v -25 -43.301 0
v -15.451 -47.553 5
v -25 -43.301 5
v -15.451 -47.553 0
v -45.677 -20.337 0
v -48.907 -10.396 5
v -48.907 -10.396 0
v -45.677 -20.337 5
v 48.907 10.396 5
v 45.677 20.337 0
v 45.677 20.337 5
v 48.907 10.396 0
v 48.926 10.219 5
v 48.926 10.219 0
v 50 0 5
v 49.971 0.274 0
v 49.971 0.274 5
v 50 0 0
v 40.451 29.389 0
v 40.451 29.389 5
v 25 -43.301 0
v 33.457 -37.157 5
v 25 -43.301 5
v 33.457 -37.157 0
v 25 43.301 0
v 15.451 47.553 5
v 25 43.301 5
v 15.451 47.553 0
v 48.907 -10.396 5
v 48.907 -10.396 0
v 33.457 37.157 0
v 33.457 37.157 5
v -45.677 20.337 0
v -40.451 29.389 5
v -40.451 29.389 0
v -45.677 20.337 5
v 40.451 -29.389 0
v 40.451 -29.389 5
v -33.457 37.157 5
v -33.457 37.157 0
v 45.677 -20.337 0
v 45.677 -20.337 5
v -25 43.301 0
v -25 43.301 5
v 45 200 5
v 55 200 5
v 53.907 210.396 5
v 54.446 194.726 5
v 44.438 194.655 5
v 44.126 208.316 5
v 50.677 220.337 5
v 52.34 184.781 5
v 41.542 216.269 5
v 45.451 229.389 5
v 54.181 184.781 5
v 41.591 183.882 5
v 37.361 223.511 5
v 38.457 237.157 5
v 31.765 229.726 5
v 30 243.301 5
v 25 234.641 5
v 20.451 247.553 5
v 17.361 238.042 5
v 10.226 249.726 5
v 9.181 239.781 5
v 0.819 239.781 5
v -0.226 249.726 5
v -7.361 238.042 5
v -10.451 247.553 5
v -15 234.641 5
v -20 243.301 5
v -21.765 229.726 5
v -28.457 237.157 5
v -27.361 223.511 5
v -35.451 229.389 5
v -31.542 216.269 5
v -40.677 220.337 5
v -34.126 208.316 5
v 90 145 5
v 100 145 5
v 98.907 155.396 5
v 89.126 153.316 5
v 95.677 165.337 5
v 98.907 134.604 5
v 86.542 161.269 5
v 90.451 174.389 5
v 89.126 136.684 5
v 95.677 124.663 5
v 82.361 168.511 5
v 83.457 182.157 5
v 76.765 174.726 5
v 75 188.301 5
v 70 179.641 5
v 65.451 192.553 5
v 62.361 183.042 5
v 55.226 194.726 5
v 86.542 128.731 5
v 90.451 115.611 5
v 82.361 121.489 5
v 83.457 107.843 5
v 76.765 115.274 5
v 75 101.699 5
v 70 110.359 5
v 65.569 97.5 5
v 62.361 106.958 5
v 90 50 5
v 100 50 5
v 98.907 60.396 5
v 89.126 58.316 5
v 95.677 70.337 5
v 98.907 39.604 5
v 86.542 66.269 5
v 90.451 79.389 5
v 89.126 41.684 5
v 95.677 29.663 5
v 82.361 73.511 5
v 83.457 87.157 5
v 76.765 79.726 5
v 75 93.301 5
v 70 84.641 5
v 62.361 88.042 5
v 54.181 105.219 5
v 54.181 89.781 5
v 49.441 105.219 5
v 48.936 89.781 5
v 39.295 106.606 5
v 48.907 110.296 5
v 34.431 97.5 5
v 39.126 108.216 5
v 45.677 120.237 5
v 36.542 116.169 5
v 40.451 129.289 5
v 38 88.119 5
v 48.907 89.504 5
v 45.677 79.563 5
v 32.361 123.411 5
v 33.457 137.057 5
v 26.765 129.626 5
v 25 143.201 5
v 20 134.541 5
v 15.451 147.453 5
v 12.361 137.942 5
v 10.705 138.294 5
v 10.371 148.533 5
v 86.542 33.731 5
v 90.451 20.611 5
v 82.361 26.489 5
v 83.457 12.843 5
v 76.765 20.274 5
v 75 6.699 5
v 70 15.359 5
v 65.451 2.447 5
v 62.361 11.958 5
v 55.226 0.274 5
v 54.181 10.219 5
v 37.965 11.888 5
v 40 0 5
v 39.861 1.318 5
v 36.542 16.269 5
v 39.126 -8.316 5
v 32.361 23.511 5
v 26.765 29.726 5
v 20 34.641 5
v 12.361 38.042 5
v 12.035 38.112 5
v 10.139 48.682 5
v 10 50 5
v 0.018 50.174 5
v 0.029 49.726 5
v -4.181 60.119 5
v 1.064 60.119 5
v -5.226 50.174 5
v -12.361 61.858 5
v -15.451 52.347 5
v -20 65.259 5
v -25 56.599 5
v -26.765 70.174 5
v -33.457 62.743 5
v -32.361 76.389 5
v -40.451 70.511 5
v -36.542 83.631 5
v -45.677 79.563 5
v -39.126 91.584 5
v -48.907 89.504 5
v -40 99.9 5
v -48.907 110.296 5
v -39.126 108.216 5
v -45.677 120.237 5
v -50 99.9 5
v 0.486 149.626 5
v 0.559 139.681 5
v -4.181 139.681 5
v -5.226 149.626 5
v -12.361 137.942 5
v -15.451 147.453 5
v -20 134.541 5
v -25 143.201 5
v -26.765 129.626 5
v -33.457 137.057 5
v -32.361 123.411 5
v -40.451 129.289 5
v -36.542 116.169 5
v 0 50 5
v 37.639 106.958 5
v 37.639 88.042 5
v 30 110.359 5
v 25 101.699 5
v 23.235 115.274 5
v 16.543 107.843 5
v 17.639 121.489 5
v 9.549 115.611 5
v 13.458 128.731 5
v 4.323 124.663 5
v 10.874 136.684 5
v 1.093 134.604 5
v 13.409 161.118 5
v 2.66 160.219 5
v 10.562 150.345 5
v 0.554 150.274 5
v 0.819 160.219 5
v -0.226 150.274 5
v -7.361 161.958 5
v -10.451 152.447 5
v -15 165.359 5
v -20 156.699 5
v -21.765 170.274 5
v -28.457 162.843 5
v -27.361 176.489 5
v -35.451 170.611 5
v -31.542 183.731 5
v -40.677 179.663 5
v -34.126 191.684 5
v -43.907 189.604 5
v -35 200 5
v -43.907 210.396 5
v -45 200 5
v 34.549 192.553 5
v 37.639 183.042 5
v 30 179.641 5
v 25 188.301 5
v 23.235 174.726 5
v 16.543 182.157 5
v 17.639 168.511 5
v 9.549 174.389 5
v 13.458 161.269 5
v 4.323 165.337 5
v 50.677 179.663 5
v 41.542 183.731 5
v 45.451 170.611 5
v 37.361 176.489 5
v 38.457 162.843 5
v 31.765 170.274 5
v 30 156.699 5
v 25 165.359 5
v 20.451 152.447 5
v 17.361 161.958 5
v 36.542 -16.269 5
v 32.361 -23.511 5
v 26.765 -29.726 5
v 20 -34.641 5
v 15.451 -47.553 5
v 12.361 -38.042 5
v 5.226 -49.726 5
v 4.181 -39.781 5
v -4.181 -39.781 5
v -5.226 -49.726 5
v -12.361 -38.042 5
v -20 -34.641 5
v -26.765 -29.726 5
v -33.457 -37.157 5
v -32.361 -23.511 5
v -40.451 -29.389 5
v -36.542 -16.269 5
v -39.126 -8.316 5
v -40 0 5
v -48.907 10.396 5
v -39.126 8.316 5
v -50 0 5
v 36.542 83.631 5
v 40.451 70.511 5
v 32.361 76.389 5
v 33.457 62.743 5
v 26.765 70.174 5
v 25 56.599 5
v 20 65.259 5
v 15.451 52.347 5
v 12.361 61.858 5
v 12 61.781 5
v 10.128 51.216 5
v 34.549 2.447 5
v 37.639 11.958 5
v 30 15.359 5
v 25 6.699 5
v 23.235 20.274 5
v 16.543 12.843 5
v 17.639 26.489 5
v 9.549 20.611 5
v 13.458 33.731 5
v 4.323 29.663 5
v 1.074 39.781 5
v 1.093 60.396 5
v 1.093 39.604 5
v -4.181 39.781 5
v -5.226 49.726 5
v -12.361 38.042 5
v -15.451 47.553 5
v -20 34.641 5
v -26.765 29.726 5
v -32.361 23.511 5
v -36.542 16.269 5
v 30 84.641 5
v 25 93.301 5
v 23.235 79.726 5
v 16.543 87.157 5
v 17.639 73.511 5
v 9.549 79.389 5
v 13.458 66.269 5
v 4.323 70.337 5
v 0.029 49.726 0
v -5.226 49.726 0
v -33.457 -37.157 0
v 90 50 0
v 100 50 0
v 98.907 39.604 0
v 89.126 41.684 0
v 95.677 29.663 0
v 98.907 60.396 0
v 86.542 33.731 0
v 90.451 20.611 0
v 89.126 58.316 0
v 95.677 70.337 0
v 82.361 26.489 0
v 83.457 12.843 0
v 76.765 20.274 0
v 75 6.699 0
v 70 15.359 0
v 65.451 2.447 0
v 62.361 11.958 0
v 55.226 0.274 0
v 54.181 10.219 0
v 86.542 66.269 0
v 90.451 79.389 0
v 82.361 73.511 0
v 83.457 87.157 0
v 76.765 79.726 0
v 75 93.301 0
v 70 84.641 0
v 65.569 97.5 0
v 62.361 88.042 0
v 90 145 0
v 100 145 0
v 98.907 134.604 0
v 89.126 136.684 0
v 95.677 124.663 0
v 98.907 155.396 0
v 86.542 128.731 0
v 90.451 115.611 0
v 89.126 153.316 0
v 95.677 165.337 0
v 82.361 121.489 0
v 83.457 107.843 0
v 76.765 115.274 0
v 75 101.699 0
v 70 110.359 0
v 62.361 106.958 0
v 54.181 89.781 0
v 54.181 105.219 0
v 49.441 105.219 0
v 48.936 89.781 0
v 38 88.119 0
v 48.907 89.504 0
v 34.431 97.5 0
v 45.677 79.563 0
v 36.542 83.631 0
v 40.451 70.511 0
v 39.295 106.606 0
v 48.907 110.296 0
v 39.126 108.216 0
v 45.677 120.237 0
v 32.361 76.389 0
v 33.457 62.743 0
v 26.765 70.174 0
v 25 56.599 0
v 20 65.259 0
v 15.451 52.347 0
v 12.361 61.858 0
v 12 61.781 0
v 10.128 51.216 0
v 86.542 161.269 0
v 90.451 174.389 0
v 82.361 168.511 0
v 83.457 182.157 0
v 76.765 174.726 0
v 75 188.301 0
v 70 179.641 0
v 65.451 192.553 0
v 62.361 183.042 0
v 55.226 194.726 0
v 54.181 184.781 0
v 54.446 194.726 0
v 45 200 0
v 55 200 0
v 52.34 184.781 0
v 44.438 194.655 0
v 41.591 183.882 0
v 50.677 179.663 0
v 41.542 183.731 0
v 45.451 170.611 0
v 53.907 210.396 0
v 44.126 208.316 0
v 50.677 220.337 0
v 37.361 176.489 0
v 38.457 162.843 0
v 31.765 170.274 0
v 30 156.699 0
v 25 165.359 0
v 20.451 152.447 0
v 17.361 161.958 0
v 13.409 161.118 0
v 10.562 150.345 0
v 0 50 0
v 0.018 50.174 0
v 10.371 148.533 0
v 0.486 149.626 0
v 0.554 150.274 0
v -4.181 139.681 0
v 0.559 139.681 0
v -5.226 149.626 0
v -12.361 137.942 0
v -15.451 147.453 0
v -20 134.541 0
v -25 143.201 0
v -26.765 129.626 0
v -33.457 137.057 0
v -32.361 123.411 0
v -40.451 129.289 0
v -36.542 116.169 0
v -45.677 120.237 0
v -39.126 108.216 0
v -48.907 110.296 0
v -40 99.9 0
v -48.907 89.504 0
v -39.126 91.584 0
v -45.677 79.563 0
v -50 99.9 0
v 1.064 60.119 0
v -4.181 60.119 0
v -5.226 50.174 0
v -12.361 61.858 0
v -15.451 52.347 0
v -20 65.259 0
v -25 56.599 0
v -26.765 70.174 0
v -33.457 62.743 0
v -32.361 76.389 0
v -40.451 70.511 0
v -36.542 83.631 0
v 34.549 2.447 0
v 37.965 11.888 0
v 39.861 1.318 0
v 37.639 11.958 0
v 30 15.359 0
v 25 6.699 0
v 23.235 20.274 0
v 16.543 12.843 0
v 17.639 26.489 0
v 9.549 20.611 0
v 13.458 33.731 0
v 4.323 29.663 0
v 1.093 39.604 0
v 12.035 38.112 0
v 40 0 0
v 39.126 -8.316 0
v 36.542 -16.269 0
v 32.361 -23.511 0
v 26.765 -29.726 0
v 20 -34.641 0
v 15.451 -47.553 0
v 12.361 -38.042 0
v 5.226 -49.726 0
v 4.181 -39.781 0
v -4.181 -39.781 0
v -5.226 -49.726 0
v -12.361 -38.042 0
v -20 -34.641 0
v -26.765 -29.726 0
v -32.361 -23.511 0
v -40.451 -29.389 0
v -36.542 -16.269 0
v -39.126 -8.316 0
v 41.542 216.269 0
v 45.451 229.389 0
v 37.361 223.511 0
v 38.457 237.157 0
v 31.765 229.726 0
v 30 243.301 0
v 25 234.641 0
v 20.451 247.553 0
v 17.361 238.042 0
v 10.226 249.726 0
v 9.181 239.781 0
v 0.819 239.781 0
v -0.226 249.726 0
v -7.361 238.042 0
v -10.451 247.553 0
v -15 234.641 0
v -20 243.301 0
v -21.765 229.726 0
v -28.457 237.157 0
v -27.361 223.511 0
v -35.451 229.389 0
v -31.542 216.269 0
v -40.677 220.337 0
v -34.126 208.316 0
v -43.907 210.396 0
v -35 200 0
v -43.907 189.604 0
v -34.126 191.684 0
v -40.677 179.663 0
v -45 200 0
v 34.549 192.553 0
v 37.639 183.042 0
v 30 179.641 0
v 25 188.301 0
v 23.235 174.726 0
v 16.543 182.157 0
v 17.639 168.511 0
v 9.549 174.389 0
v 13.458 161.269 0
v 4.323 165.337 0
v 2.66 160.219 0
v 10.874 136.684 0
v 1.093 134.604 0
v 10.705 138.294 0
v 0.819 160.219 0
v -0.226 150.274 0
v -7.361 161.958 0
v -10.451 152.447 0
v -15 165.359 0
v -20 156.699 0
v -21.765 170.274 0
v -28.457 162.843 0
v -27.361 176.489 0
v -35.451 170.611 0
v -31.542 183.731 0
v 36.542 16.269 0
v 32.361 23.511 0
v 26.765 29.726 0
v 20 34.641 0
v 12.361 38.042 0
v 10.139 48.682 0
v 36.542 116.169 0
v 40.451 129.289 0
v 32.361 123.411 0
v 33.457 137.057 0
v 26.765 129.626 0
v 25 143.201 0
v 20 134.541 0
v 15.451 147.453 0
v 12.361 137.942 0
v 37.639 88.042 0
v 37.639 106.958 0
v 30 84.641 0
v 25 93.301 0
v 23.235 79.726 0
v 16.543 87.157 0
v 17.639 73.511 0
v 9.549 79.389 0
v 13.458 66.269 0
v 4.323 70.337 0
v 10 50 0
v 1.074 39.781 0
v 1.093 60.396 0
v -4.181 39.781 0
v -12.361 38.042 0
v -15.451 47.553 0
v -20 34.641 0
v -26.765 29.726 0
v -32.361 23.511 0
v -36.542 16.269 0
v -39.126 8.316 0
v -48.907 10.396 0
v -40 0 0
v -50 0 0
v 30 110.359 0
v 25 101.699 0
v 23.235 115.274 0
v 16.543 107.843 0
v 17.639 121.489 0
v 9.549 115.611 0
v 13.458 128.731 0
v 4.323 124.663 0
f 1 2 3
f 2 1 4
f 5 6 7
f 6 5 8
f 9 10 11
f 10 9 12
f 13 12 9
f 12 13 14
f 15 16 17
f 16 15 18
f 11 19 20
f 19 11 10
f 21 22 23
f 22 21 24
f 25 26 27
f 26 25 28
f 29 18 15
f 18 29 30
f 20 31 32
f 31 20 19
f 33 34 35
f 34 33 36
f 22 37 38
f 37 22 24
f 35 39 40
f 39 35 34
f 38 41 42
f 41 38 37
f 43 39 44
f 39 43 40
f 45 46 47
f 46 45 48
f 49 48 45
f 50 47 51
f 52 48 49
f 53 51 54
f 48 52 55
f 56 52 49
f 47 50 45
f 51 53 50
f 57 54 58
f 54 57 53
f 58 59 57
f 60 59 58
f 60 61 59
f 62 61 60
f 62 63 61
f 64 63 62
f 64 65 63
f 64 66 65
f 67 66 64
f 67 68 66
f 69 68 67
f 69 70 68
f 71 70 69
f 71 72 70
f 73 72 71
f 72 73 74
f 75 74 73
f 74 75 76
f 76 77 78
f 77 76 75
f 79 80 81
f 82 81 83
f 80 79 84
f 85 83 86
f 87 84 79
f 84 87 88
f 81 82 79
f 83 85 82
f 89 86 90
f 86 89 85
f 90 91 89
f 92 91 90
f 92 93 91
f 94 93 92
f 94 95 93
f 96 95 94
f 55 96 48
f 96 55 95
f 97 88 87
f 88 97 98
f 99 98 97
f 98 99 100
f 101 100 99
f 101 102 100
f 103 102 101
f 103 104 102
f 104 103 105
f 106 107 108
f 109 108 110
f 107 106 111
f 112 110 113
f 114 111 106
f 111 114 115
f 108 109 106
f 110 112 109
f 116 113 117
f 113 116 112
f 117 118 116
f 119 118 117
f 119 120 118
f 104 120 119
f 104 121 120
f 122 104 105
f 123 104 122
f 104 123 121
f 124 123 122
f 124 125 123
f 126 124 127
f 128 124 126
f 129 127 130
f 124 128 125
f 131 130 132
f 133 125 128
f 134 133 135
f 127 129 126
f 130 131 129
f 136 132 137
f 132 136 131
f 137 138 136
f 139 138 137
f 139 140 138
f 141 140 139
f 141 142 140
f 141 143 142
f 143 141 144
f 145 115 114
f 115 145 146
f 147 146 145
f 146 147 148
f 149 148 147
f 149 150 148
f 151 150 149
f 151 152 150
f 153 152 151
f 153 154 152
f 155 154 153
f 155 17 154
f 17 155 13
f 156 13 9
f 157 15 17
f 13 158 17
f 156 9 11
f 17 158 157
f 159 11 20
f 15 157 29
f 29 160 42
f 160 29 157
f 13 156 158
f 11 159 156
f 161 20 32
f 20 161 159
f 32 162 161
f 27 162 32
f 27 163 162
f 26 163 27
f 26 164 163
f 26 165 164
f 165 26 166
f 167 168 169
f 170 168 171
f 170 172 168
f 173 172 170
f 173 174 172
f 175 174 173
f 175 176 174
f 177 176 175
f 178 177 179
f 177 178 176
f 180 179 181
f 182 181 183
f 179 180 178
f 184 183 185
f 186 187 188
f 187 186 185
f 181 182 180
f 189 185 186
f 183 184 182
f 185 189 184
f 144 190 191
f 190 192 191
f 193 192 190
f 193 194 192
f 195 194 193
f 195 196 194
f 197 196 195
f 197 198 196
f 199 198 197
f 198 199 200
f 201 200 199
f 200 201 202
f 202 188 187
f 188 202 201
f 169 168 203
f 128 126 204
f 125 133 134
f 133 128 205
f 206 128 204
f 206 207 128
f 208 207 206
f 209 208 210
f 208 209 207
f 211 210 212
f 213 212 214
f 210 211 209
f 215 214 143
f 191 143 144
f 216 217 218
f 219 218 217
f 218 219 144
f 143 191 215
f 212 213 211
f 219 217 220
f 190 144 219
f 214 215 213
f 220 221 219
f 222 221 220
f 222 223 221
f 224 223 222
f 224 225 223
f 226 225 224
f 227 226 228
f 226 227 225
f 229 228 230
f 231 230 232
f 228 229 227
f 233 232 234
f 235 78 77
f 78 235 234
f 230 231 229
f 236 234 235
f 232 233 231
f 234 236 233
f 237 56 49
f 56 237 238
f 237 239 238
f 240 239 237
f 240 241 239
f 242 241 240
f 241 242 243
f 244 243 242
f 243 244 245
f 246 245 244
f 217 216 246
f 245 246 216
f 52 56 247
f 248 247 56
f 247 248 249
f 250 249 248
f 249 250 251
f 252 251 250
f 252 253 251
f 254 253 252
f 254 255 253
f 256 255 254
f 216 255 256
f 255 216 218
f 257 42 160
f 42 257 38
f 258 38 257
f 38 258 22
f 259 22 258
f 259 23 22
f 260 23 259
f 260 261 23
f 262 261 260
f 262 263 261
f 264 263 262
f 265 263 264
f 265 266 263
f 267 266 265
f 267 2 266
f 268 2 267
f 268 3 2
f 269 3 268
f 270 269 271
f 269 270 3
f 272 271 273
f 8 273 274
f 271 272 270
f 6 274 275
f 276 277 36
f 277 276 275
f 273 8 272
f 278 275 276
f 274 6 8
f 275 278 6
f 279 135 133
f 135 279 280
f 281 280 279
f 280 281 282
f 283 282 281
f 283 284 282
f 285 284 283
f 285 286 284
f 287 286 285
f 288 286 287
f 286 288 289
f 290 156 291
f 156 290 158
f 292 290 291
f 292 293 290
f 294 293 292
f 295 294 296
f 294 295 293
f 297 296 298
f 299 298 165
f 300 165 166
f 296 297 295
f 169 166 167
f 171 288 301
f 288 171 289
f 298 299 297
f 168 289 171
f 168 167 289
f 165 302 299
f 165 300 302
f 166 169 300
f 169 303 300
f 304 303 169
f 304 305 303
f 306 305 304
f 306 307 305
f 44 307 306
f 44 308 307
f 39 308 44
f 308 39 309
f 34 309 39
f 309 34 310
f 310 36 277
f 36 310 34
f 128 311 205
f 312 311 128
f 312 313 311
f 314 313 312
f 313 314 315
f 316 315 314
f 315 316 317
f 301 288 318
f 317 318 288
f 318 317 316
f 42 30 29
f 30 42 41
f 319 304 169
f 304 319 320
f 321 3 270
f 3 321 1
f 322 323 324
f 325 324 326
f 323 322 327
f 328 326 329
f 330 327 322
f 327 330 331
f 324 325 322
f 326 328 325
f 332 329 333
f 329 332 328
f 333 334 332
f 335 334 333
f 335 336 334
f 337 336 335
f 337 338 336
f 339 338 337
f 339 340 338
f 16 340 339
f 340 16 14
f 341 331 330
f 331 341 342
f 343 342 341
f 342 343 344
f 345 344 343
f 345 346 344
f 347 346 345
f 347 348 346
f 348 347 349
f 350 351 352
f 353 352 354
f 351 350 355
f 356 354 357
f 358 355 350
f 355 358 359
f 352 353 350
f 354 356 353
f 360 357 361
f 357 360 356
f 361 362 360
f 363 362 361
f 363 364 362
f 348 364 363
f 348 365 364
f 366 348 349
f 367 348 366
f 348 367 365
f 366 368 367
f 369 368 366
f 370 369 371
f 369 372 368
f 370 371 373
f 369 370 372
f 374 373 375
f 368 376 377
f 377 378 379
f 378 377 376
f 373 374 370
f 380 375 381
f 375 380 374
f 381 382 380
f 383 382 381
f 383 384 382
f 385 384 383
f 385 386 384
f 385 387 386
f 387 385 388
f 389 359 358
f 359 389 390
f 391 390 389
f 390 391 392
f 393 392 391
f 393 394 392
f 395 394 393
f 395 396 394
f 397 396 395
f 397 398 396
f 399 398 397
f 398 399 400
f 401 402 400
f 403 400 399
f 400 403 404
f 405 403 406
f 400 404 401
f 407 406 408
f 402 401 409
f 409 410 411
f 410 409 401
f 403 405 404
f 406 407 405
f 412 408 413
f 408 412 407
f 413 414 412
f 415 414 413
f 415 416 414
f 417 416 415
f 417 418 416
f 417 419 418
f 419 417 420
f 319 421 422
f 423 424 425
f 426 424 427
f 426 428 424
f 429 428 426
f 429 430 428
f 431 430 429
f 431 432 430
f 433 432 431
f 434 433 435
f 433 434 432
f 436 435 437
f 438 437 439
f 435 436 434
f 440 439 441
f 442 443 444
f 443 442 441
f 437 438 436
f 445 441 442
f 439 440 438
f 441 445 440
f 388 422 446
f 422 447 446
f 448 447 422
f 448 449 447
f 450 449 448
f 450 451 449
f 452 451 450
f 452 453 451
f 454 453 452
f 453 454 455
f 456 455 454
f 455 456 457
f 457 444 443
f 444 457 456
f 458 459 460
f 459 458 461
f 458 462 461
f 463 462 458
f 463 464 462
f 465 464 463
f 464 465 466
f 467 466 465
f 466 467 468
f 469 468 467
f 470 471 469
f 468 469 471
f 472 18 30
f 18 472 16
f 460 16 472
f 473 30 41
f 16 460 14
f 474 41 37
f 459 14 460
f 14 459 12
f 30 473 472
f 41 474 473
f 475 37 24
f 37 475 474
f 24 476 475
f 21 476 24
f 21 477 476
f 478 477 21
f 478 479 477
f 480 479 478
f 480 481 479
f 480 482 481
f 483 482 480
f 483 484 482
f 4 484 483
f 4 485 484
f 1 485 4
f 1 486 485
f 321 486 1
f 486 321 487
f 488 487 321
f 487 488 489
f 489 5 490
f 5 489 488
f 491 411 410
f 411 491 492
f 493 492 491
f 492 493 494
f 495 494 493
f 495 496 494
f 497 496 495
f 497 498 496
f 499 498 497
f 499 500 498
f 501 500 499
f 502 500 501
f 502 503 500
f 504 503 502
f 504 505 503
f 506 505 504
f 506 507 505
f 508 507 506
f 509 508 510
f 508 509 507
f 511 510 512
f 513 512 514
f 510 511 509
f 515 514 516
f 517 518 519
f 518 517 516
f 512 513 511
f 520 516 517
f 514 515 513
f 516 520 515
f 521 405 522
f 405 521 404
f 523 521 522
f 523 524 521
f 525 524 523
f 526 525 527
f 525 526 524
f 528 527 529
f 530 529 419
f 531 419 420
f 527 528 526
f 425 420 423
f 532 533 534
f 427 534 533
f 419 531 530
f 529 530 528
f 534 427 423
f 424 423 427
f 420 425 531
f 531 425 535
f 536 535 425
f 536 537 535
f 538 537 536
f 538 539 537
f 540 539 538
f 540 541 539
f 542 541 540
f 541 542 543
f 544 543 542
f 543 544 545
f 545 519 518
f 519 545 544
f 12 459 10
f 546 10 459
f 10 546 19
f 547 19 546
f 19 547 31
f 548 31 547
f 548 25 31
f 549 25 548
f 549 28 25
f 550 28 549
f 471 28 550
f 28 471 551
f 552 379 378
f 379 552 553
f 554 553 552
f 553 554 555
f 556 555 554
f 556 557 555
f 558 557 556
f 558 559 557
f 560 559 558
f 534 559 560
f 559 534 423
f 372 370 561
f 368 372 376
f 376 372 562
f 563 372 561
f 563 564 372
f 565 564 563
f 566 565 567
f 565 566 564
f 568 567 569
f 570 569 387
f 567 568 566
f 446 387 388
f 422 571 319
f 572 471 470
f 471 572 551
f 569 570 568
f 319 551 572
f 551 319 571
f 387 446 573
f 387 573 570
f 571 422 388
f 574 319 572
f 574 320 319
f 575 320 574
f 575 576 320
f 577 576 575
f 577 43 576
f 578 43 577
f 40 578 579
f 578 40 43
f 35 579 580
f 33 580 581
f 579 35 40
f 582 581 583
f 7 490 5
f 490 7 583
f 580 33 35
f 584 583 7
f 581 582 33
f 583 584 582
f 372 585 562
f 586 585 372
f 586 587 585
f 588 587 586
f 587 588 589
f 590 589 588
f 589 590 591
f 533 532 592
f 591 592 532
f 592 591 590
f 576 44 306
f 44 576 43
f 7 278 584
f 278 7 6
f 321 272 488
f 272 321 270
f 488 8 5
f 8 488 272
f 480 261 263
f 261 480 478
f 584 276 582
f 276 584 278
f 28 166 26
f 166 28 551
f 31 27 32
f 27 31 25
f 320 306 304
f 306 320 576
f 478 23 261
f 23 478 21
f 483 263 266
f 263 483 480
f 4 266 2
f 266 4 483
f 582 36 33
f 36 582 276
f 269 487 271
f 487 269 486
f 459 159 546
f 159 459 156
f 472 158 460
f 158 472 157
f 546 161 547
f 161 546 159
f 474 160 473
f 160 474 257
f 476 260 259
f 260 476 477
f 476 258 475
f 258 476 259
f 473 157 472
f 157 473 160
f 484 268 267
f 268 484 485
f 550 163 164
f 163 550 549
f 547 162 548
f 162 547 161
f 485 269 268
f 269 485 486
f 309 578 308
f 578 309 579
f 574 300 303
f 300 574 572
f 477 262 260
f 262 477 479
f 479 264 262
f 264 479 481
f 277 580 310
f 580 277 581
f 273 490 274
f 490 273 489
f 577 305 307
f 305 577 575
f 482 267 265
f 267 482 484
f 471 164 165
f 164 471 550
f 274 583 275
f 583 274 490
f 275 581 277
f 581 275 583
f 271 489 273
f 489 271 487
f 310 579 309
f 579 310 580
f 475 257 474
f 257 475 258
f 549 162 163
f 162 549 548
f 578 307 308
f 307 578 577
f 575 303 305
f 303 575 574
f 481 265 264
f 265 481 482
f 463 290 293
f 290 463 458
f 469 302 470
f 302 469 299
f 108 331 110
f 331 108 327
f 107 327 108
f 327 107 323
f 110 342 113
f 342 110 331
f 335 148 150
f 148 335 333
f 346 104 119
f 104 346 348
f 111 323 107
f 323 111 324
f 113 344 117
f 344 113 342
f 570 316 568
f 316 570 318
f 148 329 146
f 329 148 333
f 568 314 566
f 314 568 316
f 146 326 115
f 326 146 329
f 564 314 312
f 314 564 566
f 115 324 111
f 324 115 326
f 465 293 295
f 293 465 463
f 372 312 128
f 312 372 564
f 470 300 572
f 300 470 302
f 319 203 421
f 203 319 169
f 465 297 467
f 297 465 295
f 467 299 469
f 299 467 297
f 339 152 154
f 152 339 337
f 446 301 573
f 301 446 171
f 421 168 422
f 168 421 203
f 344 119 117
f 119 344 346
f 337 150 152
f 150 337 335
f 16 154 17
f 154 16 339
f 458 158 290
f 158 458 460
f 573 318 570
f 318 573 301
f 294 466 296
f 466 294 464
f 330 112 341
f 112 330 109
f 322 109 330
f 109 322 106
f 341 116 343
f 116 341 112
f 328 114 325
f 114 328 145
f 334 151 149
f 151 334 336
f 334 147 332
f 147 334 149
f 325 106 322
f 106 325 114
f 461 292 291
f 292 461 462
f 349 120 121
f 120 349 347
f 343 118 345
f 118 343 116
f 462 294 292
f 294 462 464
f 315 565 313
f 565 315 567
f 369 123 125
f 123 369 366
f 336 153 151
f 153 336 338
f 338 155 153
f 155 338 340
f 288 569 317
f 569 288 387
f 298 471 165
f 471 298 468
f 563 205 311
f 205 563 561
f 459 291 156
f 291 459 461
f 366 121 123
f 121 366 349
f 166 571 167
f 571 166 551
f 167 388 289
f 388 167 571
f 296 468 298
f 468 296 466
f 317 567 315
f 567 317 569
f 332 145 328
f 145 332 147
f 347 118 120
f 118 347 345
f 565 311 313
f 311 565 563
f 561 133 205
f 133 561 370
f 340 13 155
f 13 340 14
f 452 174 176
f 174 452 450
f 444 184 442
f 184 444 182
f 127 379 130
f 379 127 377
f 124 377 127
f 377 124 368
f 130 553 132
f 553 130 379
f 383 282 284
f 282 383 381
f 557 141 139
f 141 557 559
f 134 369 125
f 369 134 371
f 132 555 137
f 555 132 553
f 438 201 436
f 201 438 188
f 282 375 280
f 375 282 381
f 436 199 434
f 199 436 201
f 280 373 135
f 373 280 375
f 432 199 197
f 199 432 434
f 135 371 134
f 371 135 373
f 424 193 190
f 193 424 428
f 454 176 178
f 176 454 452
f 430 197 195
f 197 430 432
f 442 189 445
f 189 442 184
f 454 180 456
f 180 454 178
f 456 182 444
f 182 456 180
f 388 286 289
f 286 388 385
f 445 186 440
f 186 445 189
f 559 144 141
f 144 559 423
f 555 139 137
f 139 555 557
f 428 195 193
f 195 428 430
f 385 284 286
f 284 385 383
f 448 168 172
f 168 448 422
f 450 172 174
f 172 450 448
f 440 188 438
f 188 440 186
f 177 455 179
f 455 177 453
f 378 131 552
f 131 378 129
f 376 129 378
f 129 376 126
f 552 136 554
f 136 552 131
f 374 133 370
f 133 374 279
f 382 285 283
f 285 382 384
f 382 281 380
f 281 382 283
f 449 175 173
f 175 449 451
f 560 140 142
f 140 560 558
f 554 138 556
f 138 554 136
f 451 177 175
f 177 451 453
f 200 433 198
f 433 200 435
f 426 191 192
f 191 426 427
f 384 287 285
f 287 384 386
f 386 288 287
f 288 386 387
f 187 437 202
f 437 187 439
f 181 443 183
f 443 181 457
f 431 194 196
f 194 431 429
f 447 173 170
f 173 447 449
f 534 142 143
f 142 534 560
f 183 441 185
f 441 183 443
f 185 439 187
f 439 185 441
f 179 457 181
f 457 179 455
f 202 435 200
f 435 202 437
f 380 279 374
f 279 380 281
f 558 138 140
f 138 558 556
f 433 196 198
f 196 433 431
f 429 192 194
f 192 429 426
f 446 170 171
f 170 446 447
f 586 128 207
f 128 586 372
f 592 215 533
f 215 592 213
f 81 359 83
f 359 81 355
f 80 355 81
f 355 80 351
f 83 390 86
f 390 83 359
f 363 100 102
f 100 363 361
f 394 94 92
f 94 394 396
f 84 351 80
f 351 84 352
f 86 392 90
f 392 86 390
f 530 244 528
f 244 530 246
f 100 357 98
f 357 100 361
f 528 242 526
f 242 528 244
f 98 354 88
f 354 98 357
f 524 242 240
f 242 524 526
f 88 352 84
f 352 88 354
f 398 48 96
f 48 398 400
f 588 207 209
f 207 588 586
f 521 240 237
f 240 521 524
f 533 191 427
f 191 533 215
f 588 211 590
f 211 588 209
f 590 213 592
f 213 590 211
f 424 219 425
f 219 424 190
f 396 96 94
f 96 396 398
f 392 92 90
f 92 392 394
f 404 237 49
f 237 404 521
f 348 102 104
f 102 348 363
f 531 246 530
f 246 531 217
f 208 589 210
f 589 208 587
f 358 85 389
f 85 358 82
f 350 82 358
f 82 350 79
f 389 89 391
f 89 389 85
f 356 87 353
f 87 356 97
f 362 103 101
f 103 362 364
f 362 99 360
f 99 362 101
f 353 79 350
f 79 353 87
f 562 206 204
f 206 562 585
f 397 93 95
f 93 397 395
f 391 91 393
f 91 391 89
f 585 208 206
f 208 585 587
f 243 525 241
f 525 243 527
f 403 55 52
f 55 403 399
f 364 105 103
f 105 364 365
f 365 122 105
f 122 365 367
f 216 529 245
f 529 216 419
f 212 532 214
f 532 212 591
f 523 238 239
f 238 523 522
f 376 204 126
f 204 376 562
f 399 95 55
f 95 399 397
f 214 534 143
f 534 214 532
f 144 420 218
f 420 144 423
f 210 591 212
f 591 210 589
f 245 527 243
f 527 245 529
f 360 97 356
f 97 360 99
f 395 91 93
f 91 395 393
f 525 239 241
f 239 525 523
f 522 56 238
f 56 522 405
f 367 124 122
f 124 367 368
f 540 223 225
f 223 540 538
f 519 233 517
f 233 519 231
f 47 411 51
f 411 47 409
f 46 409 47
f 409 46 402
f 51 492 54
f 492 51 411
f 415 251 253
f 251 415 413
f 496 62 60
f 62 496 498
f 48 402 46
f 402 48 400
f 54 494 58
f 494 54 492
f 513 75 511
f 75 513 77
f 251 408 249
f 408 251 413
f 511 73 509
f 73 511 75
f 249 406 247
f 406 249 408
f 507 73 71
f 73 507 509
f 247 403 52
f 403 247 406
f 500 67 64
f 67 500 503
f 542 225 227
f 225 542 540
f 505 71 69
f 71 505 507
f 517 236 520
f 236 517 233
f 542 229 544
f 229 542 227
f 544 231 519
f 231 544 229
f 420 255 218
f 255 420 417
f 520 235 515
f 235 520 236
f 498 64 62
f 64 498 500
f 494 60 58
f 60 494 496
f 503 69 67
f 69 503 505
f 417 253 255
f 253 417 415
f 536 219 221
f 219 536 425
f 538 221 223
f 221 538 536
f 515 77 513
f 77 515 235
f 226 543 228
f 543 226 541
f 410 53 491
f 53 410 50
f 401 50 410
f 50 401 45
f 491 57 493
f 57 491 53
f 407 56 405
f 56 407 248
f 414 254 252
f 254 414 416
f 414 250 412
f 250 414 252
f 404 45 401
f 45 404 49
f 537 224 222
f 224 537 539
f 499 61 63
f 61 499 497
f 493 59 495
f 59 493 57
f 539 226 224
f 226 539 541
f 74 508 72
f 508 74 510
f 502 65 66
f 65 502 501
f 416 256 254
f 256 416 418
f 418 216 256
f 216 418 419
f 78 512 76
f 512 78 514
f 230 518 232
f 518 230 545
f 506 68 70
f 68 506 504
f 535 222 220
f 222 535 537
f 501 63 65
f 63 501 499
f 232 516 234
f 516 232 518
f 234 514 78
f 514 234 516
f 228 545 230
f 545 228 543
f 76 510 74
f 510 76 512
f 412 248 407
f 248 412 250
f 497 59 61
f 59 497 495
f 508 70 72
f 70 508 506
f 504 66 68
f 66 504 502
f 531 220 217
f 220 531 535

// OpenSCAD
difference(){
cylinder(5,50,50);
cylinder(5,40,40);
}
 translate([50,50,0])
 difference(){
 cylinder(5,50,50);
 cylinder(5,40,40);
}
  translate([0,99.9,0])
  difference(){
  cylinder(5,50,50);
  cylinder(5,40,40);
}
   translate([50,145,0])
   difference(){
   cylinder(5,50,50);
   cylinder(5,40,40);
}
    translate([5,200,0])
    difference(){
    cylinder(5,50,50);
    cylinder(5,40,40);
}
